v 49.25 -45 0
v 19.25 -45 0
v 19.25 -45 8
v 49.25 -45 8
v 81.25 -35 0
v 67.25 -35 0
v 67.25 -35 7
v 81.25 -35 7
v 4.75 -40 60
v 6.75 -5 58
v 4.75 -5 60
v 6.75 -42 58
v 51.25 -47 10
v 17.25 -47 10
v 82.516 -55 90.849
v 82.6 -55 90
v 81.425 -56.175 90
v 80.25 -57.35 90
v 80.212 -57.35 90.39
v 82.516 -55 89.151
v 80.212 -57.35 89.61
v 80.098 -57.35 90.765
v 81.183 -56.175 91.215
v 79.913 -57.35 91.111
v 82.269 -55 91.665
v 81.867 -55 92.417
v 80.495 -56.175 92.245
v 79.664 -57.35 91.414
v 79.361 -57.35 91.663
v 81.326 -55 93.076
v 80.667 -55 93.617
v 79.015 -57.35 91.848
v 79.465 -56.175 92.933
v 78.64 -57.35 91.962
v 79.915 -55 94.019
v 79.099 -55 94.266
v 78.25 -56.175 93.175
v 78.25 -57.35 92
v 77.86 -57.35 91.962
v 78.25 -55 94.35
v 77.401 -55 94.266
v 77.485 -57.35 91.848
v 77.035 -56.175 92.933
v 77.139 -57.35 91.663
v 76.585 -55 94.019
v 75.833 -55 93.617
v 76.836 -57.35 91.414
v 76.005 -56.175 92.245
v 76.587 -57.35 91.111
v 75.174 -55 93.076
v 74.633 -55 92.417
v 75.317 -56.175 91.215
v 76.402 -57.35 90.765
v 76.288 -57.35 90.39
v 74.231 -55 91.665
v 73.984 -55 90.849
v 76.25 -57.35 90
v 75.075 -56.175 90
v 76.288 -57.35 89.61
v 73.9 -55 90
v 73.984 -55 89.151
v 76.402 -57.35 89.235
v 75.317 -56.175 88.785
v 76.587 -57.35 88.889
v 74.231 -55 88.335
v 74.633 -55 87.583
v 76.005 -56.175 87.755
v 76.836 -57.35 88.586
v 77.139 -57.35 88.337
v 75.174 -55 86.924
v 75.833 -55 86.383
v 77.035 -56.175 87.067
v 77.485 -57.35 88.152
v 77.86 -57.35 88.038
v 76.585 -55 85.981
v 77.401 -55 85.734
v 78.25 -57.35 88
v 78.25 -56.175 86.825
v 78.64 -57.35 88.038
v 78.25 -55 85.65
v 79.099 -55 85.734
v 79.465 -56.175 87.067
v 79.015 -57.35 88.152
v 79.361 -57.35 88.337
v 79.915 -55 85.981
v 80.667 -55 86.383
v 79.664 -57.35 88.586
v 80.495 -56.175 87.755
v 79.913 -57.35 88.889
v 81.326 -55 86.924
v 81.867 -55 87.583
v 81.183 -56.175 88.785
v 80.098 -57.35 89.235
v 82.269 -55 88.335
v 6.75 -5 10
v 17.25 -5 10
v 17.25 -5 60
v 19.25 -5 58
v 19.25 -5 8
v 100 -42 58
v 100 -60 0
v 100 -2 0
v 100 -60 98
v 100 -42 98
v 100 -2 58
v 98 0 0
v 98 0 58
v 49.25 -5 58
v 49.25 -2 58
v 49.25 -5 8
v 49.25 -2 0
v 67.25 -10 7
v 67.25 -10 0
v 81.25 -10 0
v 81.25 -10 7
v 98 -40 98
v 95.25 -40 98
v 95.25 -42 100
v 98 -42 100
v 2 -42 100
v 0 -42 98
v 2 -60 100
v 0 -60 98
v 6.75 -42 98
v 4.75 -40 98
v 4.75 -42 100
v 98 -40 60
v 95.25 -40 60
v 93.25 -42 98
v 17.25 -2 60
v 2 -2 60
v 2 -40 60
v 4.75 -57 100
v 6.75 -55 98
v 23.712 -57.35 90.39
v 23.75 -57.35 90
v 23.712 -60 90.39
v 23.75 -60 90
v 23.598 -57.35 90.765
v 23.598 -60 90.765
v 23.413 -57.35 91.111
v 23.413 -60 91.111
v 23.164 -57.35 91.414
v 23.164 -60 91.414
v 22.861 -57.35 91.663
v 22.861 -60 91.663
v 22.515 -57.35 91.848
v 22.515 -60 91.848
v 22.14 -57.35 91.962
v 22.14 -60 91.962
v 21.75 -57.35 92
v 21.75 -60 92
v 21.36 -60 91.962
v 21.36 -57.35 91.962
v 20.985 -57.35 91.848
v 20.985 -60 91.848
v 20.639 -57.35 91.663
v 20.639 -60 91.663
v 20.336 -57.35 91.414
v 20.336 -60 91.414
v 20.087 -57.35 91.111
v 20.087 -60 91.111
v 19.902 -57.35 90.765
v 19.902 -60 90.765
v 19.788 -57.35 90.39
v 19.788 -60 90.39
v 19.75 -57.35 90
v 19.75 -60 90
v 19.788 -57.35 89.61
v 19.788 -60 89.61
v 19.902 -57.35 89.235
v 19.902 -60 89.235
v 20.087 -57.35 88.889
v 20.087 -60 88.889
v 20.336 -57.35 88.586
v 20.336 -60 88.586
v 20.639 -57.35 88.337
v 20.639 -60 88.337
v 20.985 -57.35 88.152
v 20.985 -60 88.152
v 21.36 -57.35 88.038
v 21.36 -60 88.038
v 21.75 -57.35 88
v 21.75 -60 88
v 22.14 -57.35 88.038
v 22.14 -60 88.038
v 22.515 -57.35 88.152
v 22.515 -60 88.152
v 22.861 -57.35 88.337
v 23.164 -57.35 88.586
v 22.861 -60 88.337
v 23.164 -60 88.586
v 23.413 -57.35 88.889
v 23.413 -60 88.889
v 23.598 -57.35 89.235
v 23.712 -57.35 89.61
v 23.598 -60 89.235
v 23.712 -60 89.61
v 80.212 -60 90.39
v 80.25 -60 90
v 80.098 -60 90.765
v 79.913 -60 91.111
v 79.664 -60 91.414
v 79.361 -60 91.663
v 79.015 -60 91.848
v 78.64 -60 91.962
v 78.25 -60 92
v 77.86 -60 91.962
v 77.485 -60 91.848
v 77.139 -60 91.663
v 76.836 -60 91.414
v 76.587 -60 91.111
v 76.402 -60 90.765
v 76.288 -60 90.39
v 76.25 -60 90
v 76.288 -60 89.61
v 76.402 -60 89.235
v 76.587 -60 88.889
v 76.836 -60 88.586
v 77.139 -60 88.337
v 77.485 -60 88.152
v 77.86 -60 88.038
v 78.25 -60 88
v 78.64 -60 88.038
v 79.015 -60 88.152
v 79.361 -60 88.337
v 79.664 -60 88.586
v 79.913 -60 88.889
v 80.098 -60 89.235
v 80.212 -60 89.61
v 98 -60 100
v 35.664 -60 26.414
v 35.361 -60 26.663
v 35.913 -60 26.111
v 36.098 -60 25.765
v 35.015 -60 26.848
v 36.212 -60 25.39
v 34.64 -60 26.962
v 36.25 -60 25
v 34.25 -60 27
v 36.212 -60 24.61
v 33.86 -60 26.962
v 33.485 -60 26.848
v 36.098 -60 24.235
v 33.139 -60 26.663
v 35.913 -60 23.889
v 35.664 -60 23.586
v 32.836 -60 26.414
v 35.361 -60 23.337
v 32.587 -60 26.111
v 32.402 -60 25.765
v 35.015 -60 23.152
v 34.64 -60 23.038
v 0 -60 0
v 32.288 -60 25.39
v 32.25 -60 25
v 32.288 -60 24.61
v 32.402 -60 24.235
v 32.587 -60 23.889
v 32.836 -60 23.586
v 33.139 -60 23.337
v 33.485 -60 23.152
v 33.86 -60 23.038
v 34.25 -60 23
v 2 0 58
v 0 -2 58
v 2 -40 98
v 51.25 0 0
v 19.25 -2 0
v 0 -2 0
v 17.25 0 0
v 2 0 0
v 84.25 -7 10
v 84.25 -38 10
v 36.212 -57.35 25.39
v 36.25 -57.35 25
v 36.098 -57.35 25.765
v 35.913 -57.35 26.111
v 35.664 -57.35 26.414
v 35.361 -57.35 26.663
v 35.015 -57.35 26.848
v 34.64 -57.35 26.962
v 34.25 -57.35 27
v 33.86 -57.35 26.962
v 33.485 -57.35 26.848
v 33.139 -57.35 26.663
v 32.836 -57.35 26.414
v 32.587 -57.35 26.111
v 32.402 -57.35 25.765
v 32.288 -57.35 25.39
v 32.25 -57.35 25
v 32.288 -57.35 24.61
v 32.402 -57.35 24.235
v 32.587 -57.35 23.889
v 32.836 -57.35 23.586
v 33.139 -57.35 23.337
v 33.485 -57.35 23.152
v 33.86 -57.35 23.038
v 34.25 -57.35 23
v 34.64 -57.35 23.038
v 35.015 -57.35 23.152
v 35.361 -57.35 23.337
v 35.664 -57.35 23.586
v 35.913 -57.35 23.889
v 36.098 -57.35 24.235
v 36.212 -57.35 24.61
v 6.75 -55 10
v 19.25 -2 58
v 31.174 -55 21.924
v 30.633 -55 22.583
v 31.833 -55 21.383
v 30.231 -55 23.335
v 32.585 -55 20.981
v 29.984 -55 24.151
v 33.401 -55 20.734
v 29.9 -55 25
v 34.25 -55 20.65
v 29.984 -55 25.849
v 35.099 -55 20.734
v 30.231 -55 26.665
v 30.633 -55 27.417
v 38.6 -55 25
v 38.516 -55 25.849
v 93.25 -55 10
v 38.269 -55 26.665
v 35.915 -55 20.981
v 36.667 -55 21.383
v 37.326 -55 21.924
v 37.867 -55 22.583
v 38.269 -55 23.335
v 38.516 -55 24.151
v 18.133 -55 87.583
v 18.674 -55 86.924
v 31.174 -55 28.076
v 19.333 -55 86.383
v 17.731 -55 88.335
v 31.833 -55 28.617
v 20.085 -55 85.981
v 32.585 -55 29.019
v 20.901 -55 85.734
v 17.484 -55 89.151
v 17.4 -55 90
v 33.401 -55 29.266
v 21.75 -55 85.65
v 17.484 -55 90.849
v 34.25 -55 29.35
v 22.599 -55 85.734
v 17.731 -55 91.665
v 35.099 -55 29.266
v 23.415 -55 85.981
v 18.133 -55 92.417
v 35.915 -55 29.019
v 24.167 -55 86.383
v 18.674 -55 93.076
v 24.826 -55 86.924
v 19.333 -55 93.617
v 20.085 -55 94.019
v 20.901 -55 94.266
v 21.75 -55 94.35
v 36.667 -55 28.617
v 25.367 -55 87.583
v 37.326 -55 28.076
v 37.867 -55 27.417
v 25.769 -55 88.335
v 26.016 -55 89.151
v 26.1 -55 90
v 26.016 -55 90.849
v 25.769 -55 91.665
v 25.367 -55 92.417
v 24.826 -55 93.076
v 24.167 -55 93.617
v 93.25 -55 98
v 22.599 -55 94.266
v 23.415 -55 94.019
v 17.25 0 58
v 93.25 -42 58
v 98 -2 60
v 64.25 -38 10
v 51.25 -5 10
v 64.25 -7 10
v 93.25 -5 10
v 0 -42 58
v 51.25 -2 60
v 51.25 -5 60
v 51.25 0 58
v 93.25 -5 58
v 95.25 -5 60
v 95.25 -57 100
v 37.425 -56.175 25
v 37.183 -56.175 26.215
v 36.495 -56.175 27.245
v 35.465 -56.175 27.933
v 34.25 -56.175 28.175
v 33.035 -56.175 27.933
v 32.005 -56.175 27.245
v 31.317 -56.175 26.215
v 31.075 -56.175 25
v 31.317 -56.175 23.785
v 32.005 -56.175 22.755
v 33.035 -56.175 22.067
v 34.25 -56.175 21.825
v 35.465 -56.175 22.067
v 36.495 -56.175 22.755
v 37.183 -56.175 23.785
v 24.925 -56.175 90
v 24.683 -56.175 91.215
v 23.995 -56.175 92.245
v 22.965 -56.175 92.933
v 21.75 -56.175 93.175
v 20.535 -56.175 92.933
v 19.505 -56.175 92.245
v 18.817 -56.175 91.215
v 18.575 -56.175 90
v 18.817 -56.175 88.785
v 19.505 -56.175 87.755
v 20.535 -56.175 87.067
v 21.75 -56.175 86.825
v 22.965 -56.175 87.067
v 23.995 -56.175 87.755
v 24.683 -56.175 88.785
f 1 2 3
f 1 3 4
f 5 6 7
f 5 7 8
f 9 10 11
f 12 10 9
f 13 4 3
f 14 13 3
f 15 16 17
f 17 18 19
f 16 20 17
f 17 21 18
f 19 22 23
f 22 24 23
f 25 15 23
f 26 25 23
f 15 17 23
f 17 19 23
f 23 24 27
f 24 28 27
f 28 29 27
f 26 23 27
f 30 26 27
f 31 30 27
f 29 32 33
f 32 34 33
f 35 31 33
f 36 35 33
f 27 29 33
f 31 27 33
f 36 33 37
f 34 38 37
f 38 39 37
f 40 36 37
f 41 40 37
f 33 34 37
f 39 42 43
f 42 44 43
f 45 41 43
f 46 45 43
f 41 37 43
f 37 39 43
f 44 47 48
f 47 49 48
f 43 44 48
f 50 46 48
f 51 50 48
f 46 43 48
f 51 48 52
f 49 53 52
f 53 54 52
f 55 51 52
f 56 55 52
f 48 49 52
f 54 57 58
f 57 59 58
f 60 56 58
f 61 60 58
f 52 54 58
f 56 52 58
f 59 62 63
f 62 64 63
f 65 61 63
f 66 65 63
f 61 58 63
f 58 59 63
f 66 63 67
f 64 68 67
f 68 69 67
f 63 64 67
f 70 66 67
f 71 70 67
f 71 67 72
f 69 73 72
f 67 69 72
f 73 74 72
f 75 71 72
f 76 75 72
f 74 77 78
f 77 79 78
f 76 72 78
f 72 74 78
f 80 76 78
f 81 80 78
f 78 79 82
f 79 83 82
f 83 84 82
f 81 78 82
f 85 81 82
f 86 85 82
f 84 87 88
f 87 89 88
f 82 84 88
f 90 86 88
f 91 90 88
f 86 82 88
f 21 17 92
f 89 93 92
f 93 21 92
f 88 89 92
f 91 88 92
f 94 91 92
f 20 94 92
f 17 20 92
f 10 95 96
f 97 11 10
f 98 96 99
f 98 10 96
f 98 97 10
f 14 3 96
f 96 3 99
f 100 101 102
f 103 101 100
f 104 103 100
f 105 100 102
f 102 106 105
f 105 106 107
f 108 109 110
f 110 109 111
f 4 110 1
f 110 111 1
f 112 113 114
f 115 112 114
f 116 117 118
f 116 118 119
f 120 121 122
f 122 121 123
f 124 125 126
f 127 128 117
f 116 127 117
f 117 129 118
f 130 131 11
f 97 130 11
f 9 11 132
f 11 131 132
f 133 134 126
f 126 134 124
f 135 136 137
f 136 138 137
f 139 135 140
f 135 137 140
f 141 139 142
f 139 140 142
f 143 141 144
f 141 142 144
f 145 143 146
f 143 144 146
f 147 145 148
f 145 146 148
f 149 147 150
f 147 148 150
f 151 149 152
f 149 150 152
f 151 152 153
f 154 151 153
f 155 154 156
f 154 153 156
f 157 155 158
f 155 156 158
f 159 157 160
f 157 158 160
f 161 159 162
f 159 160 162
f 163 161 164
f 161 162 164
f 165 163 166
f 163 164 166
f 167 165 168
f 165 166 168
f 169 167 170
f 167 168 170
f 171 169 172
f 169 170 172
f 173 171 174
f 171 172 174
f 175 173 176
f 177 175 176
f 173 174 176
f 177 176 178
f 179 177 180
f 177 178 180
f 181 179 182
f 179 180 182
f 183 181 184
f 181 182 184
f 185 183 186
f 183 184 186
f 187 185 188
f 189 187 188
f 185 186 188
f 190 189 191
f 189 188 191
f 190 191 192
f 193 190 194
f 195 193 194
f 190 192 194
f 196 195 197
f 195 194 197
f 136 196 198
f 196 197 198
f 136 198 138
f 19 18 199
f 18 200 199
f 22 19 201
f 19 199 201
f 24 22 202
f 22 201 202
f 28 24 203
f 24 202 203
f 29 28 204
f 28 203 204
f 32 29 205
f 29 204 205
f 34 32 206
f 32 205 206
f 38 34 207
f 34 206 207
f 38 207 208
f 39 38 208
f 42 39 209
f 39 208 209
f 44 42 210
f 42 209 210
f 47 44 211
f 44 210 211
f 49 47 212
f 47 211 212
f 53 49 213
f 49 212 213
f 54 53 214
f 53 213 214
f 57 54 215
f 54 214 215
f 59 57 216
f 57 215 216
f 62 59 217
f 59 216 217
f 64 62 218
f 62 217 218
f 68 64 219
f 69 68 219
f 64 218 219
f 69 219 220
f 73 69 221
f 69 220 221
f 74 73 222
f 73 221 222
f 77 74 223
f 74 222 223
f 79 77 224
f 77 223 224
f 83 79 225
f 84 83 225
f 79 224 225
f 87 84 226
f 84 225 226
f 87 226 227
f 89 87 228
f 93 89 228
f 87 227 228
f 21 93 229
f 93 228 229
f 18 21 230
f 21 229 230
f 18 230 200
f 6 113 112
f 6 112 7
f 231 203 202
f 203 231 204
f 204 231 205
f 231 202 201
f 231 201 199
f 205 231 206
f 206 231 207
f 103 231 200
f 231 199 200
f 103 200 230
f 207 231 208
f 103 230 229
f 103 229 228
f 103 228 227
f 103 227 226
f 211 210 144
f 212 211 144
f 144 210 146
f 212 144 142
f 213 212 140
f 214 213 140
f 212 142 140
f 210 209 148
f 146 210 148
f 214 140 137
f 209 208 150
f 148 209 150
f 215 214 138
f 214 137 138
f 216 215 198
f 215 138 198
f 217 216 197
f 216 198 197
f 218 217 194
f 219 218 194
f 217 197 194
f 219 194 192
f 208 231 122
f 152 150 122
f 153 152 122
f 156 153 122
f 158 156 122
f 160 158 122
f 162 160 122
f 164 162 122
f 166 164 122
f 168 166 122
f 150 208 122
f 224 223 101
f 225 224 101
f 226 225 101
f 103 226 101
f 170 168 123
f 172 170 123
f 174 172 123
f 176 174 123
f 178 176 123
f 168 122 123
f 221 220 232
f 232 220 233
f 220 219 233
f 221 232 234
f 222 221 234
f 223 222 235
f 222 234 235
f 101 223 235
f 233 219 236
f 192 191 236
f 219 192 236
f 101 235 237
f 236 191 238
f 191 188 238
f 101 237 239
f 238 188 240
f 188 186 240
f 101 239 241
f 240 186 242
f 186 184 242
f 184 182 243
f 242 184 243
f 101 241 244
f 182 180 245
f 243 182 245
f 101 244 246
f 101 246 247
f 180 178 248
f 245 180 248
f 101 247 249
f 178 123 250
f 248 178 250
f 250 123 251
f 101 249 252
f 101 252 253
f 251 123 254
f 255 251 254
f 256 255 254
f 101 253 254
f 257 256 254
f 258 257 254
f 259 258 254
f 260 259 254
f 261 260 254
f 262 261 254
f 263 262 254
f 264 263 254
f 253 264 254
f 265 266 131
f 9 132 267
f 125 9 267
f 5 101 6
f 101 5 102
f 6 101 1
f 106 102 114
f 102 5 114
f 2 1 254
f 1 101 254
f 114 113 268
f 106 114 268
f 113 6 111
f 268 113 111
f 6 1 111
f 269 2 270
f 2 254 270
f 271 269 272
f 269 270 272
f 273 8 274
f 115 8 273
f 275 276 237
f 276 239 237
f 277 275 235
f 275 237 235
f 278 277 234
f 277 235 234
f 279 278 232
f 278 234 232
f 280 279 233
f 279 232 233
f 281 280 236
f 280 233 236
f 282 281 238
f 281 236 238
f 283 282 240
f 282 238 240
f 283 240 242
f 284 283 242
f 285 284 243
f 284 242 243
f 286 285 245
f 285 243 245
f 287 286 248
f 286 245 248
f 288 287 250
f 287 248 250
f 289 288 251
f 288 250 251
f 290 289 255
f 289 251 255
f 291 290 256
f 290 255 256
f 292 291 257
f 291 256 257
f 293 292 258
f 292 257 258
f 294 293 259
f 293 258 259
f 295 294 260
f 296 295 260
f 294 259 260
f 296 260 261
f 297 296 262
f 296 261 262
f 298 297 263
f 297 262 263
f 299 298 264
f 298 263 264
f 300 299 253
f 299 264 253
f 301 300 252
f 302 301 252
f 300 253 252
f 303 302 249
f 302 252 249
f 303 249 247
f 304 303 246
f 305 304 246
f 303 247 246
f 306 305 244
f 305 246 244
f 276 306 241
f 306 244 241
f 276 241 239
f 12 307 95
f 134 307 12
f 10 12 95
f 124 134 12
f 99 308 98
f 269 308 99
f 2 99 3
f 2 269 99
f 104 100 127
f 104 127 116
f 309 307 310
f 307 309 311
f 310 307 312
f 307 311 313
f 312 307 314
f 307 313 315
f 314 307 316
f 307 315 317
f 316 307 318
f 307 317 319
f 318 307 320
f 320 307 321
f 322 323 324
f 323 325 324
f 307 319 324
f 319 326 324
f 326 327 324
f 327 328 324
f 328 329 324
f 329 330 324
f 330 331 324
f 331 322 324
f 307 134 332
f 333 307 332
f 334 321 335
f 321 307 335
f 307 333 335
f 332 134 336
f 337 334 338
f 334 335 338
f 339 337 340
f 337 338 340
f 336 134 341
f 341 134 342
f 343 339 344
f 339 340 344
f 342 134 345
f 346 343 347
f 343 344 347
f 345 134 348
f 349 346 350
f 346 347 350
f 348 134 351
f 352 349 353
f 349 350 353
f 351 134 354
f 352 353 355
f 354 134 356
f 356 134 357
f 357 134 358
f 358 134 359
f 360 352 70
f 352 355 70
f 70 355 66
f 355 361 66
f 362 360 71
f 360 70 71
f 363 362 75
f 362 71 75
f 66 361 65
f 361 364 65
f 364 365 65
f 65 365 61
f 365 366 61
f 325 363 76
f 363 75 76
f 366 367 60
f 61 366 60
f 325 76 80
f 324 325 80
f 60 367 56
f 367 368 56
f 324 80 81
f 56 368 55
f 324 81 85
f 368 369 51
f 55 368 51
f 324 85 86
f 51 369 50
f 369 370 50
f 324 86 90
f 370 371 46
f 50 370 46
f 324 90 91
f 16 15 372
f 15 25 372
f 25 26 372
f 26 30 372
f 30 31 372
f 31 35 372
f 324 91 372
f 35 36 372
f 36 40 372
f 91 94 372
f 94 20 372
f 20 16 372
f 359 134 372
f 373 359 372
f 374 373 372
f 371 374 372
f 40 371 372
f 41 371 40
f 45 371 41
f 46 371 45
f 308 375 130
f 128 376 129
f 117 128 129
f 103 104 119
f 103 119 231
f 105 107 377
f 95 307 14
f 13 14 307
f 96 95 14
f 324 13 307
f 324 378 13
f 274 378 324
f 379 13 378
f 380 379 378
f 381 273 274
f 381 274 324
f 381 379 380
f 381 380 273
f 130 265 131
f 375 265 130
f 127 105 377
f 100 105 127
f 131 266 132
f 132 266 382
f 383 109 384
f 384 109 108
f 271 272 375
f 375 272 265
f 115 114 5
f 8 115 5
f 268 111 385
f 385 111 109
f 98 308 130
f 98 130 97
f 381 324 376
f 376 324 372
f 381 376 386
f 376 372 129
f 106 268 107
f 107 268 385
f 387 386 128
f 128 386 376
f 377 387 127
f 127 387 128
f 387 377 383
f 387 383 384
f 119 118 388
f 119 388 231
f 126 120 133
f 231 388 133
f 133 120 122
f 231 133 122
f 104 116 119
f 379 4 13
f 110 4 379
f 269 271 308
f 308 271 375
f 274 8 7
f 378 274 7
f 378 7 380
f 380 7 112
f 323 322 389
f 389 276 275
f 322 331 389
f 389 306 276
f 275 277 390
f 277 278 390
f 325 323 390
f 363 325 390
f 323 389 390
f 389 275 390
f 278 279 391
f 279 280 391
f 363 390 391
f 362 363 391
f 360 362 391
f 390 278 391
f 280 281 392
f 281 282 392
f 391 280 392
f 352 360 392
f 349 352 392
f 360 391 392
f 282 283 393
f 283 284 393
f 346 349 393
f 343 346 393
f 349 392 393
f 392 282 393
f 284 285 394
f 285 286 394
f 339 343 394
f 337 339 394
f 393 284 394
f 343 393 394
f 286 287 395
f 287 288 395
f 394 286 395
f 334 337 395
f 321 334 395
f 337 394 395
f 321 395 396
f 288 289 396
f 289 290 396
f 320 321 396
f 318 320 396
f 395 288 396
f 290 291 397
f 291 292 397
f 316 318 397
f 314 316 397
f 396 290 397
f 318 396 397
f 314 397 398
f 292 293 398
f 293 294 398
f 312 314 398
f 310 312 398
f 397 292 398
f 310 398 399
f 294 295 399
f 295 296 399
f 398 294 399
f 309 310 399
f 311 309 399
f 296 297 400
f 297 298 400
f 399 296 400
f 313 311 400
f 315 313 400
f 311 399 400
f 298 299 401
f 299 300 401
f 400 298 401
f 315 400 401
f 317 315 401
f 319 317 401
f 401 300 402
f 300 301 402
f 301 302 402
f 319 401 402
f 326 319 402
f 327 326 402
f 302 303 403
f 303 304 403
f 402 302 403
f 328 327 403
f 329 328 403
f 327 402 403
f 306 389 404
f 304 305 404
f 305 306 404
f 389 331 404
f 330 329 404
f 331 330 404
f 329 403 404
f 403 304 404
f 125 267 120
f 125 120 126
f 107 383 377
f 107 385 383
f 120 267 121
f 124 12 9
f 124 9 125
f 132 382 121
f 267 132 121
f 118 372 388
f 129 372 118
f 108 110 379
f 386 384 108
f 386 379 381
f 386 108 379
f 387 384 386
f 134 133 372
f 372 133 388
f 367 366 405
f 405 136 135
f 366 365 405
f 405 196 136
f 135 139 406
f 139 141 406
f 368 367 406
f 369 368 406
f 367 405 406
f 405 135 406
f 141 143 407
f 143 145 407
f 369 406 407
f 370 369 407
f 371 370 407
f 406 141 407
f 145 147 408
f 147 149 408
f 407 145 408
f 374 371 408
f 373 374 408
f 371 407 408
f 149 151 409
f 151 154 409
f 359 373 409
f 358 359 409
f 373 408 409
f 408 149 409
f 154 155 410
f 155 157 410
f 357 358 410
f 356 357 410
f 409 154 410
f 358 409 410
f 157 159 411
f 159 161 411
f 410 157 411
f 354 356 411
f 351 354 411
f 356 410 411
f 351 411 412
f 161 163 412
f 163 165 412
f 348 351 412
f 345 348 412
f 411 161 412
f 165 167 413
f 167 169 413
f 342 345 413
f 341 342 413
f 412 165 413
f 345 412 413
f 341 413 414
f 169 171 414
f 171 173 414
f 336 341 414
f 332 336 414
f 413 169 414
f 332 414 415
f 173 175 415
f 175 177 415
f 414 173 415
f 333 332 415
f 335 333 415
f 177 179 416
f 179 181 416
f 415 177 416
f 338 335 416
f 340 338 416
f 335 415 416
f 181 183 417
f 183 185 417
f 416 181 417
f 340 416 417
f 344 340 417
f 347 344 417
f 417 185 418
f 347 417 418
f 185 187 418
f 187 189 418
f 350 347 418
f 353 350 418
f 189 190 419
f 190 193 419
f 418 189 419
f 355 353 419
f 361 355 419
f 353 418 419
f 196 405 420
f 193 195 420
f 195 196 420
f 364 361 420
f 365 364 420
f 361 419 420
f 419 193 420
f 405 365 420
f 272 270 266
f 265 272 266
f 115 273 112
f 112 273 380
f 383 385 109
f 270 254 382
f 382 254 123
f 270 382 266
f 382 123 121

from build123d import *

# Parameters (mm, degrees)
F1_DEPTH       = 100
F2_W           = 86.5
F2_H           = 50
F3_DEPTH       = 90
F4_W           = 30
F4_H           = 45
F4_W_2         = 14
F4_H_2         = 25
F5_DEPTH       = 60
F7_D           = 4
F7_CSINK_D     = 8.7
F7_CSINK_ANGLE = 90
F8_SIZE        = 2
F9_SIZE        = 3


with BuildPart() as f1:
    # F0 (on Right) → F1 (new body)
    with BuildSketch(Plane.YZ):
        Polygon((-60, 0), (0, 0), (0, 60), (-40, 60), (-40, 100), (-60, 100), align=None)
    extrude(amount=F1_DEPTH)

    # F2 (on face) → F3 (cut)
    with BuildSketch(Plane.XY.offset(100)):
        with Locations((50, -30)):
            Rectangle(F2_W, F2_H)
    extrude(amount=-F3_DEPTH, mode=Mode.SUBTRACT)

    # F4 (on face) → F5 (cut)
    with BuildSketch(Plane(origin=(0, 0, 0), x_dir=(1, 0, 0), z_dir=(0, 0, -1))):
        with Locations((34.25, 22.5)):
            Rectangle(F4_W, F4_H)
        with Locations((74.25, 22.5)):
            Rectangle(F4_W_2, F4_H_2)
    extrude(amount=-F5_DEPTH, mode=Mode.SUBTRACT)

    # F7 (through all)
    with Locations(Plane(origin=(0, -55, 0), x_dir=(-1, 0, 0), z_dir=(0, 1, 0))):
        with Locations((-78.25, 90), (-21.75, 90), (-34.25, 25)):
            CounterSinkHole(F7_D / 2, F7_CSINK_D / 2, counter_sink_angle=F7_CSINK_ANGLE)

    # F8
    f8_edges = [f1.edges().sort_by_distance(p)[0] for p in [
        (74.625, 0, 60),
        (100, 0, 30),
        (0, 0, 30),
        (19.25, 0, 30),
        (49.25, -25, 10),
        (34.25, -45, 10),
        (49.25, 0, 30),
        (100, -20, 60),
        (93.25, -22.5, 60),
        (6.75, -22.5, 60),
        (0, -20, 60),
        (9.625, 0, 60),
        (0, -40, 80),
        (6.75, -40, 80),
        (93.25, -40, 80),
        (100, -40, 80),
        (3.375, -40, 100),
        (0, -50, 100),
        (6.75, -47.5, 100),
        (93.25, -47.5, 100),
        (96.625, -40, 100),
        (100, -50, 100),
        (50, -55, 100),
        (19.25, -2.5, 60),
        (49.25, -2.5, 60),
        (19.25, -25, 10),
    ]]
    chamfer(f8_edges, length=F8_SIZE)

    # F9
    f9_edges = [f1.edges().sort_by_distance(p)[0] for p in [
        (67.25, -22.5, 10),
        (74.25, -10, 10),
        (81.25, -22.5, 10),
        (74.25, -35, 10),
    ]]
    chamfer(f9_edges, length=F9_SIZE)


solid = f1.part
